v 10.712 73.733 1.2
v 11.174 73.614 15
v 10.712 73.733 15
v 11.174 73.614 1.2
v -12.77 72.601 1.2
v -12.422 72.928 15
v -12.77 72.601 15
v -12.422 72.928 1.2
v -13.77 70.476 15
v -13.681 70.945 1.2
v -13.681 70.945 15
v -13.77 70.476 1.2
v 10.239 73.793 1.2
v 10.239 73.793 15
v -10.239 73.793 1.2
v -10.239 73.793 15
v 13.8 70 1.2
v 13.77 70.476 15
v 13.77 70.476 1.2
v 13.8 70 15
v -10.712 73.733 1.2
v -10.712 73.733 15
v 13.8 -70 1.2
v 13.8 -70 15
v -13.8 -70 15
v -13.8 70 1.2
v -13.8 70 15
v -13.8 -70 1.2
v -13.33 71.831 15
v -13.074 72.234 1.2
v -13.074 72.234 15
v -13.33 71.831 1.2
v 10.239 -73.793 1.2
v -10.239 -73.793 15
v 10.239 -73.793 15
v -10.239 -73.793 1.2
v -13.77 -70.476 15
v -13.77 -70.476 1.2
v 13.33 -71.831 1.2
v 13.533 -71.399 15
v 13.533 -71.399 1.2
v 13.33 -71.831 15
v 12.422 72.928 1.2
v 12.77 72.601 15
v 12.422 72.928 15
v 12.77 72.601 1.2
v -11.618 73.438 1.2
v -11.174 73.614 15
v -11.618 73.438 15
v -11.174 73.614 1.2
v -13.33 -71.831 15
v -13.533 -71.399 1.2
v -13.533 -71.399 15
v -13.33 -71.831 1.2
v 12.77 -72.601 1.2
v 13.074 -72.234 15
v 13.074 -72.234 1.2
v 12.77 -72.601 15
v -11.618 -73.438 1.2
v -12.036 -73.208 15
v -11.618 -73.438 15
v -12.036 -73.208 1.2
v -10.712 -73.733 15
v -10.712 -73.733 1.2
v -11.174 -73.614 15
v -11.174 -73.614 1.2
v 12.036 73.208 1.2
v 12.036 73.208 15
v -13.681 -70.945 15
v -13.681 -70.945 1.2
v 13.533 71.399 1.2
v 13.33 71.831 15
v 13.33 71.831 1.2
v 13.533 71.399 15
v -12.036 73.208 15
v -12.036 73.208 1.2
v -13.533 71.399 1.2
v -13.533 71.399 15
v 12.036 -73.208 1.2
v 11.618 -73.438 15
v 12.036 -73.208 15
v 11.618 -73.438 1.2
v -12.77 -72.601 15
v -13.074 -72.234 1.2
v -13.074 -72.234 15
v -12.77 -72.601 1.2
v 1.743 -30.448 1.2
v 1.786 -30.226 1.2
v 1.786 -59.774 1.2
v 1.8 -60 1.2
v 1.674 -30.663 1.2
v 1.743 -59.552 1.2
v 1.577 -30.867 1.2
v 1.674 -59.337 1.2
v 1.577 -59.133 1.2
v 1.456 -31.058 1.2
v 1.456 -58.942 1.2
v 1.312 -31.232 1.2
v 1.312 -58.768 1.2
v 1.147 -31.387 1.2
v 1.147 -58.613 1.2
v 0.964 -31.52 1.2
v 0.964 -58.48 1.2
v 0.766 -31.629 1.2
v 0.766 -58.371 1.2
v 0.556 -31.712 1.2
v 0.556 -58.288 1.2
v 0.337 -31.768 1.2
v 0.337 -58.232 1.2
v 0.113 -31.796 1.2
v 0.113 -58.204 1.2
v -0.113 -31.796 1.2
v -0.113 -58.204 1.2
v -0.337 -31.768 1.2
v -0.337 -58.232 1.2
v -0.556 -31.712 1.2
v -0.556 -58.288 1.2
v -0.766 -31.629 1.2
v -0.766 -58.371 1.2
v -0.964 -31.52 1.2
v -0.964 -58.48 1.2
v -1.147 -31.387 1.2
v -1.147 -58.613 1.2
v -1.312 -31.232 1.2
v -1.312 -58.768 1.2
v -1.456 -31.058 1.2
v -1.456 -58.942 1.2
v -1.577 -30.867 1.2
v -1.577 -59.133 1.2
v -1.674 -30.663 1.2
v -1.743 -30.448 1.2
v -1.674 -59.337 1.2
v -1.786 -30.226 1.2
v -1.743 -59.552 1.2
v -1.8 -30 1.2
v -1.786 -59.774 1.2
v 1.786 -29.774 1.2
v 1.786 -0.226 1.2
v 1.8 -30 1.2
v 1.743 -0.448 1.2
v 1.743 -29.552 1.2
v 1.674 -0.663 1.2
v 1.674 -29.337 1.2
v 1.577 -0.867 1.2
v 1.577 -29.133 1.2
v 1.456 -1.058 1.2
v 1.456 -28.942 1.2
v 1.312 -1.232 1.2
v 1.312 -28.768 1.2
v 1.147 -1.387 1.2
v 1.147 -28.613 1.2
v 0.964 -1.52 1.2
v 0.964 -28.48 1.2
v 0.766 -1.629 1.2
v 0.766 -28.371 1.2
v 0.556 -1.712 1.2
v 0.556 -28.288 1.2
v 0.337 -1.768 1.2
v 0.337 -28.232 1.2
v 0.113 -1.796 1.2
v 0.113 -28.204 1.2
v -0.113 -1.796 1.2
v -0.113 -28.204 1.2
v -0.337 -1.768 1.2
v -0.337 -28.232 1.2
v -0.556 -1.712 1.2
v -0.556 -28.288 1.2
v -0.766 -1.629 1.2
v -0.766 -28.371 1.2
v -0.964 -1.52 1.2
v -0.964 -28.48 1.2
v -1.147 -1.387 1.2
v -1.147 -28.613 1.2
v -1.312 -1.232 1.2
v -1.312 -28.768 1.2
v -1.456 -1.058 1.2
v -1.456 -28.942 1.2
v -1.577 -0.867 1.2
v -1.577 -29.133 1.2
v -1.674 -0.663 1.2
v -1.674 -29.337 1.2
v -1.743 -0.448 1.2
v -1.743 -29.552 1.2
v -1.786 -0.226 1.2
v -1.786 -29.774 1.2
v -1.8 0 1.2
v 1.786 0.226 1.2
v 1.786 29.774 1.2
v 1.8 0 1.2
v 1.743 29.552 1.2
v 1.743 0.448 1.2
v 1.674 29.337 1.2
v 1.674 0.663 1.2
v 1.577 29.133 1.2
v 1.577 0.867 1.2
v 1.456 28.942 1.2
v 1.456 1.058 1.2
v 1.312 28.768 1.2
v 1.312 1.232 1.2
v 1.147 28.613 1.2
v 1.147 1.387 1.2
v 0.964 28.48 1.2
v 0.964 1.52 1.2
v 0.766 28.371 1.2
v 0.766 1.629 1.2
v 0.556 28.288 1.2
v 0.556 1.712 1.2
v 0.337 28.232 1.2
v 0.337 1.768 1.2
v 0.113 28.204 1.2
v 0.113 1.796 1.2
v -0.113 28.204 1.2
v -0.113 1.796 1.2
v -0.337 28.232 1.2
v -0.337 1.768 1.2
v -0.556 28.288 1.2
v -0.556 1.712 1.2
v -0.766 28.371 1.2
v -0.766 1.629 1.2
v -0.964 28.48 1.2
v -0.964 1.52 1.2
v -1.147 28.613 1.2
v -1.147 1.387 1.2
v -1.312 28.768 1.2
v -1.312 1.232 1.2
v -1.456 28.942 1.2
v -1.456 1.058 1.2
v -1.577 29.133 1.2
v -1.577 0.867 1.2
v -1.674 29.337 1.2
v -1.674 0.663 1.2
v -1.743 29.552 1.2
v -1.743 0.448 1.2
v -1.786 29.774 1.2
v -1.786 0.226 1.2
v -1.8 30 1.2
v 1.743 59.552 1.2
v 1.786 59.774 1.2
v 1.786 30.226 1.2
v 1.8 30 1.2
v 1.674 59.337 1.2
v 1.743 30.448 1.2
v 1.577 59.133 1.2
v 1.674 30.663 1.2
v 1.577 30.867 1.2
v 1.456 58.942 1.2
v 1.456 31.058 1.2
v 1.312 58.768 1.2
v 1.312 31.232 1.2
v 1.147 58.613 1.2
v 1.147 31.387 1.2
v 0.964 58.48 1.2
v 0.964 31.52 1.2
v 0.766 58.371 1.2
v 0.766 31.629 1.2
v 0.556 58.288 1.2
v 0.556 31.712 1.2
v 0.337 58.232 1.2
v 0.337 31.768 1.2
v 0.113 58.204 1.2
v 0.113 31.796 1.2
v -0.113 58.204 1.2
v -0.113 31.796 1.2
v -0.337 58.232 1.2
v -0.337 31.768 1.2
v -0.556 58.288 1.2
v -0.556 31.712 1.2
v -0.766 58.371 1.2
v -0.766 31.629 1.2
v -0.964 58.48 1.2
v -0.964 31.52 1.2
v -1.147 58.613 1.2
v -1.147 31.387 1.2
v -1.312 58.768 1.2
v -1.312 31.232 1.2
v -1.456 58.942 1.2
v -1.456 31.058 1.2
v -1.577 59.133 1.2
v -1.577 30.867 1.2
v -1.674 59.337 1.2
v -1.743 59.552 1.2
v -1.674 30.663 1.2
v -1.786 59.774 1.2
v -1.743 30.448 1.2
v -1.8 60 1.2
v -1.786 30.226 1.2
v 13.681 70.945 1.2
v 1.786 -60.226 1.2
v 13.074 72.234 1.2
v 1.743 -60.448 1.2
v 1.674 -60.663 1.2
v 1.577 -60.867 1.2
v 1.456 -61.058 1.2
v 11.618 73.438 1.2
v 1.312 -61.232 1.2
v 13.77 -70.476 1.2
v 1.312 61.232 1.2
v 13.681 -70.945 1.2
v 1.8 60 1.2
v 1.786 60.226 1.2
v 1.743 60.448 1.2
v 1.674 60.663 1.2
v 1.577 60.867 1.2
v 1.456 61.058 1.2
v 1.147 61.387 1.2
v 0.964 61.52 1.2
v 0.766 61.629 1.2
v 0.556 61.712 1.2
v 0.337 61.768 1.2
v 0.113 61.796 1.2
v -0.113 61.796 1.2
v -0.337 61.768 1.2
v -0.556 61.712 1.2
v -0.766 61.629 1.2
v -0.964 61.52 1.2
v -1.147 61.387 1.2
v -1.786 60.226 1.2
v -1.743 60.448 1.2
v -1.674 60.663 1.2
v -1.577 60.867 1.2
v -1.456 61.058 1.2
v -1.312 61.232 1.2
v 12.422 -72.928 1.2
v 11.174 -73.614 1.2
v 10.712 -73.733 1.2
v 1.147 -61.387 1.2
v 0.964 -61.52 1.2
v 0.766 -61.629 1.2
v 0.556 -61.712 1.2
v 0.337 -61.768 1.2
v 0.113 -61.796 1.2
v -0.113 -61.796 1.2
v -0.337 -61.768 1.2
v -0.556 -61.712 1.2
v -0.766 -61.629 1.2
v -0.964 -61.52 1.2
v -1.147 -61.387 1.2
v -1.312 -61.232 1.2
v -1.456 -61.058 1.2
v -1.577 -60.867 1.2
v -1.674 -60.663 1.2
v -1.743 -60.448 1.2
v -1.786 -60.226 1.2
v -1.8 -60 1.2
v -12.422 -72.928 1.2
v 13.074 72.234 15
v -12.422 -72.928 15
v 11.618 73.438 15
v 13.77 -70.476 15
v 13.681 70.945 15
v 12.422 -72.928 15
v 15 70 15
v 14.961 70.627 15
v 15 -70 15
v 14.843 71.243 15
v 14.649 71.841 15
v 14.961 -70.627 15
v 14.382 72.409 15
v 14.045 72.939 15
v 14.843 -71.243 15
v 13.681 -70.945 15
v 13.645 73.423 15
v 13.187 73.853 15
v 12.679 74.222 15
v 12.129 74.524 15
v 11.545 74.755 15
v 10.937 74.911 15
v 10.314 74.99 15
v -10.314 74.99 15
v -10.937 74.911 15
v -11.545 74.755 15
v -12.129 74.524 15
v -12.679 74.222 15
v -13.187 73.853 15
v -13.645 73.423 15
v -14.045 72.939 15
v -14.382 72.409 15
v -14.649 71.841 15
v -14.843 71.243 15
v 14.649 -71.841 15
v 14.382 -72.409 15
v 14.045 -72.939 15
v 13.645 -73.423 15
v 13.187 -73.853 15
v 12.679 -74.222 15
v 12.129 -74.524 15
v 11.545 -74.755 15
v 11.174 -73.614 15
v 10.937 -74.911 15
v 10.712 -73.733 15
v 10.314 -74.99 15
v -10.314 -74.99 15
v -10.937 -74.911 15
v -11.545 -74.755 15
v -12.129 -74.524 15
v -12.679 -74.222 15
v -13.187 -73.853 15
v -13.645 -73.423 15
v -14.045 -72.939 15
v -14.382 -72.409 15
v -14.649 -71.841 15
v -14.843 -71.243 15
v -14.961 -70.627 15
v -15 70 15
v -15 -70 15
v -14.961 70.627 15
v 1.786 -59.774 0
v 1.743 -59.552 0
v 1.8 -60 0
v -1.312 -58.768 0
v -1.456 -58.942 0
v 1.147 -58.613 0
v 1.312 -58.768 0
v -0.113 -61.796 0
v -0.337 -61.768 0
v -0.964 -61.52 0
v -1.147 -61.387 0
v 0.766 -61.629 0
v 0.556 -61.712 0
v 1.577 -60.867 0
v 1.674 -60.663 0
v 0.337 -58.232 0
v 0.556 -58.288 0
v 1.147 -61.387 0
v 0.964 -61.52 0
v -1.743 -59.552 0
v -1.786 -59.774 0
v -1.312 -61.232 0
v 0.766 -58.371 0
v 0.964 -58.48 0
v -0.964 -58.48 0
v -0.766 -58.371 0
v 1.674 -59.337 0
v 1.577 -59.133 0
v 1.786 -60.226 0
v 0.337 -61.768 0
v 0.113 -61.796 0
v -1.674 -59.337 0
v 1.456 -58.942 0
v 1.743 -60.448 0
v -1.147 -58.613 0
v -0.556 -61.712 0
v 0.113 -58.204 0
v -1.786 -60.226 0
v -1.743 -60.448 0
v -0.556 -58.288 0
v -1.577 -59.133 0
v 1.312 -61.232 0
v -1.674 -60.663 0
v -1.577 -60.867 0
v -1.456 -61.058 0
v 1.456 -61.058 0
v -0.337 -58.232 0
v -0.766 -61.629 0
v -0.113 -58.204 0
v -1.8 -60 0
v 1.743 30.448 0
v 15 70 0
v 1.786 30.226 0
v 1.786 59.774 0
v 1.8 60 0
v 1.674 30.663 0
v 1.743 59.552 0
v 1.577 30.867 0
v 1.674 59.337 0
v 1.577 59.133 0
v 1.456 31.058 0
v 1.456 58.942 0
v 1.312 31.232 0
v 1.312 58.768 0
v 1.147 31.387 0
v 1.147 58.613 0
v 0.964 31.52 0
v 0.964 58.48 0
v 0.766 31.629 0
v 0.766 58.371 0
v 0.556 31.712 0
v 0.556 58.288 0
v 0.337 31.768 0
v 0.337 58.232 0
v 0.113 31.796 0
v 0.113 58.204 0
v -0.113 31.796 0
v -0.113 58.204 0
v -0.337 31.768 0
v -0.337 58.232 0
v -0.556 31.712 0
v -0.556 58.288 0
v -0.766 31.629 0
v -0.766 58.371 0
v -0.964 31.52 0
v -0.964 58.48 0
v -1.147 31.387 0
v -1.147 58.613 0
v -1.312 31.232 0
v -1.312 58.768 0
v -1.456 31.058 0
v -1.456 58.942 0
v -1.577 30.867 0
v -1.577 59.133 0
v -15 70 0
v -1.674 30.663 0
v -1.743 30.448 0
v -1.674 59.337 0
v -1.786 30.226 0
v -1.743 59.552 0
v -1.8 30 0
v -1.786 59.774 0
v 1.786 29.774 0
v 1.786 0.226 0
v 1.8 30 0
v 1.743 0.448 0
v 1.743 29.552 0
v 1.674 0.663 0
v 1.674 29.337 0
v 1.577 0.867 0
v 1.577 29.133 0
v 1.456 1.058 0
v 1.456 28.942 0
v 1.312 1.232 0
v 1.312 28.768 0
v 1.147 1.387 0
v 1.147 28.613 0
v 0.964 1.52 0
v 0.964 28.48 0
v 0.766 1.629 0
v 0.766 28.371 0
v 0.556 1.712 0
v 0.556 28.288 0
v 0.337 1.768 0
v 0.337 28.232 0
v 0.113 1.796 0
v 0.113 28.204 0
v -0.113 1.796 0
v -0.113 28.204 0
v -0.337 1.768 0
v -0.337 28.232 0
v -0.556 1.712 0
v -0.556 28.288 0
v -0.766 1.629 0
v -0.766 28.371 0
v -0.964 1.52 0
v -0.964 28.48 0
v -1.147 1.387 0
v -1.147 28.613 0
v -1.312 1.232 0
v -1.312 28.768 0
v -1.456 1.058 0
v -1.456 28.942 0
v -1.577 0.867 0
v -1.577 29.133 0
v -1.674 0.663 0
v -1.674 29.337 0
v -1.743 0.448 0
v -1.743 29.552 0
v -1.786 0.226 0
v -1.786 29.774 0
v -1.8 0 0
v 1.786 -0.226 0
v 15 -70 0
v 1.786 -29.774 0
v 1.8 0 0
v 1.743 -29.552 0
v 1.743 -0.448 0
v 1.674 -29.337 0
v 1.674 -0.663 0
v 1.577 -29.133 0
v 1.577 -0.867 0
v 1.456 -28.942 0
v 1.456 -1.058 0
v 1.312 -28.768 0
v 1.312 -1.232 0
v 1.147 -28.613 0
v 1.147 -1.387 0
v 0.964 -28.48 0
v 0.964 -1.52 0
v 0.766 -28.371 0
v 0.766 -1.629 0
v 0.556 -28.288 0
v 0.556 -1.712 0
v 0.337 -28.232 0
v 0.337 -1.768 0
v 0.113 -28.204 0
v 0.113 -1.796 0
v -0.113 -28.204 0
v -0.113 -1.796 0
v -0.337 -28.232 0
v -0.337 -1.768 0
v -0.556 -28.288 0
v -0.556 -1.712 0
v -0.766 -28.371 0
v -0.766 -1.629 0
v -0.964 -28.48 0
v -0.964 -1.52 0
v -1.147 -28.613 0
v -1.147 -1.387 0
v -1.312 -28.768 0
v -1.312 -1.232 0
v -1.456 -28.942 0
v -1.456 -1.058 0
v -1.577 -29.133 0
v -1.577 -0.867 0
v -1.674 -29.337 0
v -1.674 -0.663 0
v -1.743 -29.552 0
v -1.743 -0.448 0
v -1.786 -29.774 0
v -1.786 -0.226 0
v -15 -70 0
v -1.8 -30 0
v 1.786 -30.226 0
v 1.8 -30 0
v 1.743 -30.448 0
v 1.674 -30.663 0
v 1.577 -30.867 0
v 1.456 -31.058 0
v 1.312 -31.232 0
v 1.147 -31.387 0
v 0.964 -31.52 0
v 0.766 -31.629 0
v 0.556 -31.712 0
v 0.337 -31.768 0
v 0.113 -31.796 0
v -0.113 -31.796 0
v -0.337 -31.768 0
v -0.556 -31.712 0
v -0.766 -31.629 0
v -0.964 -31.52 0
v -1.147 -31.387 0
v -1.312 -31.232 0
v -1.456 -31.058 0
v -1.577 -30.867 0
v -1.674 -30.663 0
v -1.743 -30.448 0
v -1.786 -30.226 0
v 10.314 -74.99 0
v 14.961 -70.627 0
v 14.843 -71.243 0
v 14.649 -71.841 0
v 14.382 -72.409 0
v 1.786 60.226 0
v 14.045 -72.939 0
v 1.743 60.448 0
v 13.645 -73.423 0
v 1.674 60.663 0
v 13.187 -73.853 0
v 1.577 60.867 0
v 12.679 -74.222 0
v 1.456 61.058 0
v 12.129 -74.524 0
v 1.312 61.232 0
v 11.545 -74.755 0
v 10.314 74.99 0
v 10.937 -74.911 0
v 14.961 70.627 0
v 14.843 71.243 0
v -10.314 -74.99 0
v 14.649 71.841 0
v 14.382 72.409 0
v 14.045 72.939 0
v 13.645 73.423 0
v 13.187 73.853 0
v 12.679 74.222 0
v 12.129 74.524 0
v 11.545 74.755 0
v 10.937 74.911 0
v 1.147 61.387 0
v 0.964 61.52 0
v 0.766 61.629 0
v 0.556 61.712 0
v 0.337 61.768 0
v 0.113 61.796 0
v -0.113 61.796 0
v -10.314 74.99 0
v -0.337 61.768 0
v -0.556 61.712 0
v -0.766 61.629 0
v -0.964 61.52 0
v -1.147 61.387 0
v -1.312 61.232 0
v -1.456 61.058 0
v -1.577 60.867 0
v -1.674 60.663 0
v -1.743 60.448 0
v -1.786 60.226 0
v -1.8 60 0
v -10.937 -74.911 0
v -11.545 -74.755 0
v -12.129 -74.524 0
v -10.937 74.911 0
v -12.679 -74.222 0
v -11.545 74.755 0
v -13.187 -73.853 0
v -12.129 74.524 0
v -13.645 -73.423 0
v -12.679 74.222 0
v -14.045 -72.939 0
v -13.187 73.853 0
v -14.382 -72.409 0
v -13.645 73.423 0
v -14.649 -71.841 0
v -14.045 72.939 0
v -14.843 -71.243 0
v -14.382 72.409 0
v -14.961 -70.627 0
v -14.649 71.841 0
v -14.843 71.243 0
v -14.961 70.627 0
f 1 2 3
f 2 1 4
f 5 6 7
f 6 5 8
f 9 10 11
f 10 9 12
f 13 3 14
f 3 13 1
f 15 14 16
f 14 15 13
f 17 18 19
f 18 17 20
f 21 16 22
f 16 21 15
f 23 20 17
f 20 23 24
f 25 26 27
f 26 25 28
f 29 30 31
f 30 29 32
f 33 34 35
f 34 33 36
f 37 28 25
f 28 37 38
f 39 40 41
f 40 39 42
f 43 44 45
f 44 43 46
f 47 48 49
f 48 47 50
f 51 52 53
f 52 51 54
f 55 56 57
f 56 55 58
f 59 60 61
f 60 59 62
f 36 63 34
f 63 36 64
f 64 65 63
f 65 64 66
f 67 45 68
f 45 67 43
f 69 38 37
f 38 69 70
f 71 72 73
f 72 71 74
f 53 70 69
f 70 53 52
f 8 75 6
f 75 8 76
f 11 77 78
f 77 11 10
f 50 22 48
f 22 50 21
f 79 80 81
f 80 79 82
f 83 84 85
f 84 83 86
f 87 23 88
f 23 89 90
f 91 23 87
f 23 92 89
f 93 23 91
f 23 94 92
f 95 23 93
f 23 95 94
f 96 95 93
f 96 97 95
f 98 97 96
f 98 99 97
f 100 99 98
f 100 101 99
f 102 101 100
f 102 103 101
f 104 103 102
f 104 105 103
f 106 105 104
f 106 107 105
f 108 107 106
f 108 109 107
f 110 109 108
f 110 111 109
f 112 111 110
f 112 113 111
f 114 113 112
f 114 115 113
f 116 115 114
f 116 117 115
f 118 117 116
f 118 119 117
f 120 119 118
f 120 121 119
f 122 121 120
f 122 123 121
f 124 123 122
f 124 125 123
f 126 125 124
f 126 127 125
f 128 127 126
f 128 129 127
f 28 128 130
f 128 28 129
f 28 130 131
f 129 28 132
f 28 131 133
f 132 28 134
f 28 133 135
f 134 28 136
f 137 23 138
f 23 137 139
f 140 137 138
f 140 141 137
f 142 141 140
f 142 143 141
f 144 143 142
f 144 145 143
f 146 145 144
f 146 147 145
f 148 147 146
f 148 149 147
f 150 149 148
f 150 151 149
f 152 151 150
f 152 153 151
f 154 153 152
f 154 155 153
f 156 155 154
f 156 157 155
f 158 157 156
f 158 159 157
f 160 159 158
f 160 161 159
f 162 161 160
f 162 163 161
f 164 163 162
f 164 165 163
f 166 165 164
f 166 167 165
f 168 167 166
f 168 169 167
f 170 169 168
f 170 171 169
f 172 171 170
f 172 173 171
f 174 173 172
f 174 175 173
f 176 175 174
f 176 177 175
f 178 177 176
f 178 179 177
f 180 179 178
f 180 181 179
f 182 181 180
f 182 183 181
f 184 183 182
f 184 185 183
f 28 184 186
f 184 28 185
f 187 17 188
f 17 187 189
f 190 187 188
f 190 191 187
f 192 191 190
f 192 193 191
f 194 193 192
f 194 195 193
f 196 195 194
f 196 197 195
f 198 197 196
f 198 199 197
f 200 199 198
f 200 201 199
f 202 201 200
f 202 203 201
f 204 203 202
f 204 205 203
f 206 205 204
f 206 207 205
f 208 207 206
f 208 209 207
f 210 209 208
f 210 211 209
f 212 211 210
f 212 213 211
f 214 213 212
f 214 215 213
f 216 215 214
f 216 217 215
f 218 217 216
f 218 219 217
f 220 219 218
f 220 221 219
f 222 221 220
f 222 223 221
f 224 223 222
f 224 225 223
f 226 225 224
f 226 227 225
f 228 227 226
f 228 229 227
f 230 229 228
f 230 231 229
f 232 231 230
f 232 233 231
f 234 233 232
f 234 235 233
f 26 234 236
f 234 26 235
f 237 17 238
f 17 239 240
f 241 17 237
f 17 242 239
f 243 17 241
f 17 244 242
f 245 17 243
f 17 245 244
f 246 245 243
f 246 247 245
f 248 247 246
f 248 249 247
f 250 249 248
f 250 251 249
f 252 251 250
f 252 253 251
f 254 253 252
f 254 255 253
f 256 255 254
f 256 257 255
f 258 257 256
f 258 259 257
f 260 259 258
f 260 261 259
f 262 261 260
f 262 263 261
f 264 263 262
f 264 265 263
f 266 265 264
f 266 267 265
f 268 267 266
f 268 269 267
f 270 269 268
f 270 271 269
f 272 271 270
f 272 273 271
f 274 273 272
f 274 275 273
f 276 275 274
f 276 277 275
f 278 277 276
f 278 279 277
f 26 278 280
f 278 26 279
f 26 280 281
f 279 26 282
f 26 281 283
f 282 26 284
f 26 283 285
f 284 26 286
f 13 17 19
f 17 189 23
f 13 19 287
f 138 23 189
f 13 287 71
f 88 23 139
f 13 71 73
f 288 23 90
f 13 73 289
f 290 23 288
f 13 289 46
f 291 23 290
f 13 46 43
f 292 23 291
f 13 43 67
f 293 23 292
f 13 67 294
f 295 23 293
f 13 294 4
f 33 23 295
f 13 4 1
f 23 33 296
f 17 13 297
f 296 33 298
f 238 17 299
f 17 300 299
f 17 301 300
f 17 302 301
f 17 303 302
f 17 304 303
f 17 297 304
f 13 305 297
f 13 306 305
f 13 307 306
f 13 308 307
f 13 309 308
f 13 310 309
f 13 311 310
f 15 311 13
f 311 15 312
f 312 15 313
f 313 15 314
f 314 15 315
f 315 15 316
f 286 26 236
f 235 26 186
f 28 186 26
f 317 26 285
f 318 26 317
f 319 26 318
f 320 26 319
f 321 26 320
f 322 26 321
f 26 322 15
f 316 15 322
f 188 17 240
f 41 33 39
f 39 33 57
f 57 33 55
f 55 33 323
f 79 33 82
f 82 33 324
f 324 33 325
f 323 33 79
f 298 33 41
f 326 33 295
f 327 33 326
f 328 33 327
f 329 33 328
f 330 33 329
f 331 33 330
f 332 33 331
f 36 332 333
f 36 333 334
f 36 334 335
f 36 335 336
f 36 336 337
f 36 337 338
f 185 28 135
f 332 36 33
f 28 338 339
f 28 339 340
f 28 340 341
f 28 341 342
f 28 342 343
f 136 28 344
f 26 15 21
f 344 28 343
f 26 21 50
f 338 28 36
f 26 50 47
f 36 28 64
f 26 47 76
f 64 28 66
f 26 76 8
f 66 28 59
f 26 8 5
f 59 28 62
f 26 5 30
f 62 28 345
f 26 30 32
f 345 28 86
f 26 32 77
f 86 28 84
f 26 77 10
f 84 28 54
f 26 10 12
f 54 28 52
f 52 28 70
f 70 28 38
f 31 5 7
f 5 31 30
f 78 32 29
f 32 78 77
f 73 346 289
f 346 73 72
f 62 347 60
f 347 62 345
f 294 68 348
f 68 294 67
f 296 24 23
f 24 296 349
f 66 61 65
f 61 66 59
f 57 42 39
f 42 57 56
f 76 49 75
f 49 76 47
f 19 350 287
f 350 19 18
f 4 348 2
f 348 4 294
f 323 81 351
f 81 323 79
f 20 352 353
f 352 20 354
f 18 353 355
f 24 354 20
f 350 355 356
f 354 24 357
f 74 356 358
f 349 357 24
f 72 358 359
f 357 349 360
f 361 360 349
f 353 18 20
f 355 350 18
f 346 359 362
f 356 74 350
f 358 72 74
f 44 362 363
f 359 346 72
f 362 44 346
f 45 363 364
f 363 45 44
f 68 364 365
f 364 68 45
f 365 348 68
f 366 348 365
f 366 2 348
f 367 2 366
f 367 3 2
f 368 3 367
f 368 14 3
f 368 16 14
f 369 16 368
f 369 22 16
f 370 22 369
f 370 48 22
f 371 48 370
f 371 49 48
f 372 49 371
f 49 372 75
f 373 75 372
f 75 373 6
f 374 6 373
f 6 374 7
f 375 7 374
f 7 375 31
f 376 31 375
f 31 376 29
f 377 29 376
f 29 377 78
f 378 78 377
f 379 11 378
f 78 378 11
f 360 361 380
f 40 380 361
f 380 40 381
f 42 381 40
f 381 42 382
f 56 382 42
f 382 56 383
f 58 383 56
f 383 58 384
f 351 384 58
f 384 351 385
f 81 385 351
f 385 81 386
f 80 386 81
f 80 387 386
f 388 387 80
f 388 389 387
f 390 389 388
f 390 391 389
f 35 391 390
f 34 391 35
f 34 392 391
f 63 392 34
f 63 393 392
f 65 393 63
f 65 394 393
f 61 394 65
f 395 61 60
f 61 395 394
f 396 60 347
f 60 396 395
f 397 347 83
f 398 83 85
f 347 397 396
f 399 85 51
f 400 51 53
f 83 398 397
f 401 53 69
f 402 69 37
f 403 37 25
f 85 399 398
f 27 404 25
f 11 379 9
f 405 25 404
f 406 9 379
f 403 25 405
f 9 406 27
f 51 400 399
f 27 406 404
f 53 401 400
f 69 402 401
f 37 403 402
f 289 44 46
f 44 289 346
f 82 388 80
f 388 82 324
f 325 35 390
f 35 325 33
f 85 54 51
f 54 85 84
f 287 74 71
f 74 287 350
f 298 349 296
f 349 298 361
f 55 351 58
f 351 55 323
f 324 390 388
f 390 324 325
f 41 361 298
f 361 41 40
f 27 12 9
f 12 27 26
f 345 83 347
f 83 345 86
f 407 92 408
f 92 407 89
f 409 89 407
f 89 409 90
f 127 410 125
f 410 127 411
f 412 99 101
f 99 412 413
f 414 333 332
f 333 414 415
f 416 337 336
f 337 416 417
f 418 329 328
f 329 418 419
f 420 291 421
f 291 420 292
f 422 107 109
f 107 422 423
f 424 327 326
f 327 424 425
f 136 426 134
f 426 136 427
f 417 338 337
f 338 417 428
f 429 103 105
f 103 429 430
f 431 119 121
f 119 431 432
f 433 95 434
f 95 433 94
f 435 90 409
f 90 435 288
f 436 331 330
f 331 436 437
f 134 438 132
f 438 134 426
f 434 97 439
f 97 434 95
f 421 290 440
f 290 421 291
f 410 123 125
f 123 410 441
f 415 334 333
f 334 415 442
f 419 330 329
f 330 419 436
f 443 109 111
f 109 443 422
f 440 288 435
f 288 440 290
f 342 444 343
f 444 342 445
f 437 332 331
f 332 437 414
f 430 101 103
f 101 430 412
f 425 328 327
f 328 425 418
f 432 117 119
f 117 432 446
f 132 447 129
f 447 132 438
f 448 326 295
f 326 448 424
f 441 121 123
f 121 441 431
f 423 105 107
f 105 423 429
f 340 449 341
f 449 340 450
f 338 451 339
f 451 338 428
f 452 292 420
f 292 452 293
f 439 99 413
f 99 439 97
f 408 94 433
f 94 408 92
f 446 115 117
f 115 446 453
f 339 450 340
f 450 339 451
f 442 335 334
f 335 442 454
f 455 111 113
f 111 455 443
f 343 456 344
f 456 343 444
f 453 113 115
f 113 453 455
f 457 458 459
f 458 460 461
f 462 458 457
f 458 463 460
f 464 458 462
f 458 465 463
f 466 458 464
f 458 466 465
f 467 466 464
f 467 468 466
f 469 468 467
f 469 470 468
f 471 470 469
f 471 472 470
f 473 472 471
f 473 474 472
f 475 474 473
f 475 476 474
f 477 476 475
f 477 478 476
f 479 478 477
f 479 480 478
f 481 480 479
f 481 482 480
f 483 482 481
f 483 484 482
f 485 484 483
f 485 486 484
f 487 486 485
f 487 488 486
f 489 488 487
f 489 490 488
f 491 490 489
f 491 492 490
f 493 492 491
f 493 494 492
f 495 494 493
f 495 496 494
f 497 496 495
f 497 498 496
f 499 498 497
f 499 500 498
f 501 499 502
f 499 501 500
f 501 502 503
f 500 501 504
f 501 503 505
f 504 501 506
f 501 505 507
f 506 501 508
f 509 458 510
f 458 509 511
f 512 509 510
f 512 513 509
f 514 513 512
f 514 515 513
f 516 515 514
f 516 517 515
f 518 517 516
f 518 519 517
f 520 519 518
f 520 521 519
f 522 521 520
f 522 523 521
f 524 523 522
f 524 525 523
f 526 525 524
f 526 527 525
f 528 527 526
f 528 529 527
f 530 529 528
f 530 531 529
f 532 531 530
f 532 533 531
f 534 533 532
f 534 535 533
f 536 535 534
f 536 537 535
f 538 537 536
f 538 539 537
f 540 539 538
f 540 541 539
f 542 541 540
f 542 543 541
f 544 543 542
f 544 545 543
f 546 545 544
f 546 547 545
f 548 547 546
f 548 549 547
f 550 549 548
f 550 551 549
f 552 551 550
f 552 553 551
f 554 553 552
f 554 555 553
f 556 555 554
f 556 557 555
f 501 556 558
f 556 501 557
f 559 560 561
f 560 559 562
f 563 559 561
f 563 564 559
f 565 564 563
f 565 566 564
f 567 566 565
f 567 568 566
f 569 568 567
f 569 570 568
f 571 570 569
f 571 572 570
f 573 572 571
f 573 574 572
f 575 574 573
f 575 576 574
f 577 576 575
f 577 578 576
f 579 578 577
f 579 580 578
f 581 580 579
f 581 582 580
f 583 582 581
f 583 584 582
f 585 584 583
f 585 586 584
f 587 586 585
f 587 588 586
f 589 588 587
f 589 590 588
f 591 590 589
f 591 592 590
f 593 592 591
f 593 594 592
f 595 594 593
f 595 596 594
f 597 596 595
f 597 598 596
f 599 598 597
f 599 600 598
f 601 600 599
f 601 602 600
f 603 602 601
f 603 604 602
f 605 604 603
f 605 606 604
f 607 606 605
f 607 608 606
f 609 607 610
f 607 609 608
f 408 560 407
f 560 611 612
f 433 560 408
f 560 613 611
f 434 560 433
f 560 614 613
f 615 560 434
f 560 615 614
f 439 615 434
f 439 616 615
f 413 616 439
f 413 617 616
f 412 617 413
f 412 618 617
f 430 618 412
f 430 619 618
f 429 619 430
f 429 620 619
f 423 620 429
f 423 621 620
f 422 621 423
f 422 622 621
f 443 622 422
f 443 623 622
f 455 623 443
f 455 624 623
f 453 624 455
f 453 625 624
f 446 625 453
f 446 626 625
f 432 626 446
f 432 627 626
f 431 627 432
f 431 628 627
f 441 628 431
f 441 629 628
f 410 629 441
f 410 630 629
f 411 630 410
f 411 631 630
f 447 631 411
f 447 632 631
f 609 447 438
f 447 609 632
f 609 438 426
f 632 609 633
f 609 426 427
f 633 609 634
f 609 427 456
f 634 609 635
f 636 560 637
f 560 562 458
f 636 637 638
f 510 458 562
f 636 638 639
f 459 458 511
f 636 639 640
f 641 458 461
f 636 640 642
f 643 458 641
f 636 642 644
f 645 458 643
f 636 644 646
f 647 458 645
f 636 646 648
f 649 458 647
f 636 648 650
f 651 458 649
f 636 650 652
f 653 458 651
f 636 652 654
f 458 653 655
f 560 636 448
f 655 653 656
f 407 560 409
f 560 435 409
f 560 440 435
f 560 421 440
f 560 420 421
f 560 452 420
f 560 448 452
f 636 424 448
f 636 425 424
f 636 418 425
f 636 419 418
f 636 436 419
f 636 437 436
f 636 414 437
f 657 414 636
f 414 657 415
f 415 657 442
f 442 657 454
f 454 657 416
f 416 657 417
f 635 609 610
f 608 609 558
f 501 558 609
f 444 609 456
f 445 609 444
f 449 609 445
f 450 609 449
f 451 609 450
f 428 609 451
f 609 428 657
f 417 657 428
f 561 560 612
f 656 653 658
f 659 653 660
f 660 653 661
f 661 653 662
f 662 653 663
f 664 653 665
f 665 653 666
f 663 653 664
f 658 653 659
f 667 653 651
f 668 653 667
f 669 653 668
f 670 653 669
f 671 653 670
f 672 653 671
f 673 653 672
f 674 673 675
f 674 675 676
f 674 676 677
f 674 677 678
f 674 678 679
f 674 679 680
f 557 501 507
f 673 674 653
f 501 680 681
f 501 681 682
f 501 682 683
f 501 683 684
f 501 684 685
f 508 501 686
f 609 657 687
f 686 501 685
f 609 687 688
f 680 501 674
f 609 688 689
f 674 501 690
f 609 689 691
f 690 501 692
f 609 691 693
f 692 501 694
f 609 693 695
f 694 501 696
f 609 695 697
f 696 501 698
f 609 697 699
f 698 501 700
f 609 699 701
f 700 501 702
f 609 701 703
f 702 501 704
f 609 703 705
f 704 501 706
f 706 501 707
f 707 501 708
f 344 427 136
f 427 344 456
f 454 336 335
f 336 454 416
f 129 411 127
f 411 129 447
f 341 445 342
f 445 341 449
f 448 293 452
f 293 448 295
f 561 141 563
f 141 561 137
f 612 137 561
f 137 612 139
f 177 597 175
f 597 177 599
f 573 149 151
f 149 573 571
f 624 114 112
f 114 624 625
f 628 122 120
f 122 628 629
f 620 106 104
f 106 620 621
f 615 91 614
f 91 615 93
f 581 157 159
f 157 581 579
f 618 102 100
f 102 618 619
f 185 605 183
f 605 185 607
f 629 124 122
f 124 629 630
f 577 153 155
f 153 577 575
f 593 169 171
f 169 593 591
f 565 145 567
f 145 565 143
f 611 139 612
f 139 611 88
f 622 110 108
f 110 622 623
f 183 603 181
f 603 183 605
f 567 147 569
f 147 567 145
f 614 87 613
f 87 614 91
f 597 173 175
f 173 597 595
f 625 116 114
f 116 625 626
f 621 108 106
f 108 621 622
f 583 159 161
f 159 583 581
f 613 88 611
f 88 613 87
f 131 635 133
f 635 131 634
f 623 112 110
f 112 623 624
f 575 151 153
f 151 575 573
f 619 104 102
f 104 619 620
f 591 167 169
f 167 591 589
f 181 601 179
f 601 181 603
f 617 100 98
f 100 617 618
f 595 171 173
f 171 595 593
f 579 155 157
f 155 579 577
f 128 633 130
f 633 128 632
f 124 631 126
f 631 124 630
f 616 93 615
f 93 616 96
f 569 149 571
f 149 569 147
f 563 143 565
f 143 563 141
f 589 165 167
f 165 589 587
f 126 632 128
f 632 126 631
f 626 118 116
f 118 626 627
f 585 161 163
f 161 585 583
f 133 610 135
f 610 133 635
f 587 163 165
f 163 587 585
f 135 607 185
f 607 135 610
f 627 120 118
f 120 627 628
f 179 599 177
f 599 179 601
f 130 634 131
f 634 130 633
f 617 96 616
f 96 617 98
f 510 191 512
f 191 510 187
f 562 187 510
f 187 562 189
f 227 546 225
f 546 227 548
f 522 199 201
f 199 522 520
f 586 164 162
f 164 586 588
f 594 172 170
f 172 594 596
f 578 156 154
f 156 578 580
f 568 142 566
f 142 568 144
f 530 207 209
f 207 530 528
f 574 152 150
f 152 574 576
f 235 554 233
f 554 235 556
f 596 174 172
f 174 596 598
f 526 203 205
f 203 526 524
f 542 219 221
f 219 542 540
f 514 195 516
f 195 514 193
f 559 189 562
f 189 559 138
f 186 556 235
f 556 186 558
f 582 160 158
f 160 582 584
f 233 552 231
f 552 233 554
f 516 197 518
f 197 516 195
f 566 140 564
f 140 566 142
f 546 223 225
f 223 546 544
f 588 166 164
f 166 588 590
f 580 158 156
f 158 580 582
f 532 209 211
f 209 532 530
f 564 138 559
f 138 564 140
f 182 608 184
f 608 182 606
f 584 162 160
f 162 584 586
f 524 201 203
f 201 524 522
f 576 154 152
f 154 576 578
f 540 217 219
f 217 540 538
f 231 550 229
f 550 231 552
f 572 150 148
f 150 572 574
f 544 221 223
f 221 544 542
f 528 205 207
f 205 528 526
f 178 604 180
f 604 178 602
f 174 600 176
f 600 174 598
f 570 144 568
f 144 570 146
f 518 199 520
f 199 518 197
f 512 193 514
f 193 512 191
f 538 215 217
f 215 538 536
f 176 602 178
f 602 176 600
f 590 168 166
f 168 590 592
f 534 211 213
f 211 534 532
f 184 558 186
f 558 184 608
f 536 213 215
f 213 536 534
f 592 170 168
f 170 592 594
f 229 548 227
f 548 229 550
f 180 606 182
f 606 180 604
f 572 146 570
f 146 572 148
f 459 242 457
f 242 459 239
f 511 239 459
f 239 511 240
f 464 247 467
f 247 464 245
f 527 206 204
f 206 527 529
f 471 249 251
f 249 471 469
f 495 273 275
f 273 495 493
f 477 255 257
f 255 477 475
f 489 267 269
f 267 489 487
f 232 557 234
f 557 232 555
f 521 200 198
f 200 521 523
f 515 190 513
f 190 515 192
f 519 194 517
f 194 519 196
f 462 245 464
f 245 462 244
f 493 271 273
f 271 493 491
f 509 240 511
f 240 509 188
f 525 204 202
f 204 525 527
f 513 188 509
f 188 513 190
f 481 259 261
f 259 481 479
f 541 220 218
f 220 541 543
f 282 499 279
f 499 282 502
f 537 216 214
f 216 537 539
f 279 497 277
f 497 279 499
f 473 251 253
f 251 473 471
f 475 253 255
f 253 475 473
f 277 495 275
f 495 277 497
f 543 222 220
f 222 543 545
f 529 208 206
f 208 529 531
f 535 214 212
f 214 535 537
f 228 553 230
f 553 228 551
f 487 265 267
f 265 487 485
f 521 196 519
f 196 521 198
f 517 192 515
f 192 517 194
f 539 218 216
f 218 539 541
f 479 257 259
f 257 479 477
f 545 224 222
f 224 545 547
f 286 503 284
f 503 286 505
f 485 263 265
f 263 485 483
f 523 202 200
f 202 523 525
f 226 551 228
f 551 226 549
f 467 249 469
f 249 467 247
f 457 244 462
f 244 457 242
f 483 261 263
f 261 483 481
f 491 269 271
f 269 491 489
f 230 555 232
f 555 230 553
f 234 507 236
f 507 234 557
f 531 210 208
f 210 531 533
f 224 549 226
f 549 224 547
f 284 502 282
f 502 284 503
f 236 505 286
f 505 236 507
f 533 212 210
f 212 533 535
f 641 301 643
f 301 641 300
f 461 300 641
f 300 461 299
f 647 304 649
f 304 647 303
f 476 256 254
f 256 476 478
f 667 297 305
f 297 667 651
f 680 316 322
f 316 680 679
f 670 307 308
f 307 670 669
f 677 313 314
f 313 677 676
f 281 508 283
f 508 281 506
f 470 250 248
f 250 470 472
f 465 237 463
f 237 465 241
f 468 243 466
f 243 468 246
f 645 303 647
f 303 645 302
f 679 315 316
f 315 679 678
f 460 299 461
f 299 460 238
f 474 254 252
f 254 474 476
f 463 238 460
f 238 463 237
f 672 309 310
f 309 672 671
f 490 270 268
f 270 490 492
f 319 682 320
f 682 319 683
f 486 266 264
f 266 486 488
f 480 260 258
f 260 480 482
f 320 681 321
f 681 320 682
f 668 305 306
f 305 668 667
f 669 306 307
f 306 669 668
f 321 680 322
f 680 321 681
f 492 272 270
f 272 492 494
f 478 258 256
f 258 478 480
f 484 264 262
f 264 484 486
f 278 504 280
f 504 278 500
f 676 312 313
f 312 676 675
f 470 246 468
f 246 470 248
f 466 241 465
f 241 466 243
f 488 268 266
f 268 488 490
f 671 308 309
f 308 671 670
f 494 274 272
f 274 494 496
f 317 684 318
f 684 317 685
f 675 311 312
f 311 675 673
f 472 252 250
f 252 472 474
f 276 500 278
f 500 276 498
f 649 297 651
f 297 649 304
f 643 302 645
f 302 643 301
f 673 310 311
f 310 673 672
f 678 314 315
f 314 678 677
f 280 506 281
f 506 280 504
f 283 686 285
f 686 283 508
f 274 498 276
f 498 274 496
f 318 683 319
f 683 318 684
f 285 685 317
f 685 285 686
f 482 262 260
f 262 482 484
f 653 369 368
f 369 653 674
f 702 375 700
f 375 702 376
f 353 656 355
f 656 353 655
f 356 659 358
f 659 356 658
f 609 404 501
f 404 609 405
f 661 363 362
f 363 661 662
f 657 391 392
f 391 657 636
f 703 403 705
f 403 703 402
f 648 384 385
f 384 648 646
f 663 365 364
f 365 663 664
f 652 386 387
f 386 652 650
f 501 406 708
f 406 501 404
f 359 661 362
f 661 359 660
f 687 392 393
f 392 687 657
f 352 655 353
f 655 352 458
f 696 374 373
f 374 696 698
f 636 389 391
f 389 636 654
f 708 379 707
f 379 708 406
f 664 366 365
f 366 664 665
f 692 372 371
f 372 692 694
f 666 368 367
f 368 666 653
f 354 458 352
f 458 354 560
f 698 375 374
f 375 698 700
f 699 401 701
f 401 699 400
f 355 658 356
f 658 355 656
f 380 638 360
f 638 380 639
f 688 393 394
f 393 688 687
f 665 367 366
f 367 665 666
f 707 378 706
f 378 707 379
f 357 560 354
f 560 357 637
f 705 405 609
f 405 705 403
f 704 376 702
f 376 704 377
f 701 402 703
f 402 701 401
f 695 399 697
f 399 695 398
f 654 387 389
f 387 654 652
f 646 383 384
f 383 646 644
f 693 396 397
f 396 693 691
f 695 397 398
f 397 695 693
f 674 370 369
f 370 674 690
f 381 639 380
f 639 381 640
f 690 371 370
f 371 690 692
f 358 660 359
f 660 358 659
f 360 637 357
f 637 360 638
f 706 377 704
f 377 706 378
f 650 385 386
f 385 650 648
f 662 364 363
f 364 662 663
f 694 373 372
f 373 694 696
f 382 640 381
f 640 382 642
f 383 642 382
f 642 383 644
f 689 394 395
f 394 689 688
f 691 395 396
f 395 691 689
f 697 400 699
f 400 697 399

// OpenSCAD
$fn = 50;


difference() {
	union() {
		hull() {
			translate(v = [-10.0000000000, 70.0000000000, 0]) {
				cylinder(h = 15, r = 5);
			}
			translate(v = [10.0000000000, 70.0000000000, 0]) {
				cylinder(h = 15, r = 5);
			}
			translate(v = [-10.0000000000, -70.0000000000, 0]) {
				cylinder(h = 15, r = 5);
			}
			translate(v = [10.0000000000, -70.0000000000, 0]) {
				cylinder(h = 15, r = 5);
			}
		}
	}
	union() {
		translate(v = [0, 0, 1.2000000000]) {
			hull() {
				translate(v = [-10.0000000000, 70.0000000000, 0]) {
					cylinder(h = 13.8000000000, r = 3.8000000000);
				}
				translate(v = [10.0000000000, 70.0000000000, 0]) {
					cylinder(h = 13.8000000000, r = 3.8000000000);
				}
				translate(v = [-10.0000000000, -70.0000000000, 0]) {
					cylinder(h = 13.8000000000, r = 3.8000000000);
				}
				translate(v = [10.0000000000, -70.0000000000, 0]) {
					cylinder(h = 13.8000000000, r = 3.8000000000);
				}
			}
		}
		#translate(v = [0.0000000000, -60.0000000000, 0]) {
			cylinder(h = 1.2000000000, r = 1.8000000000);
		}
		#translate(v = [0.0000000000, -30.0000000000, 0]) {
			cylinder(h = 1.2000000000, r = 1.8000000000);
		}
		#cylinder(h = 1.2000000000, r = 1.8000000000);
		#translate(v = [0.0000000000, 30.0000000000, 0]) {
			cylinder(h = 1.2000000000, r = 1.8000000000);
		}
		#translate(v = [0.0000000000, 60.0000000000, 0]) {
			cylinder(h = 1.2000000000, r = 1.8000000000);
		}
	}
}
